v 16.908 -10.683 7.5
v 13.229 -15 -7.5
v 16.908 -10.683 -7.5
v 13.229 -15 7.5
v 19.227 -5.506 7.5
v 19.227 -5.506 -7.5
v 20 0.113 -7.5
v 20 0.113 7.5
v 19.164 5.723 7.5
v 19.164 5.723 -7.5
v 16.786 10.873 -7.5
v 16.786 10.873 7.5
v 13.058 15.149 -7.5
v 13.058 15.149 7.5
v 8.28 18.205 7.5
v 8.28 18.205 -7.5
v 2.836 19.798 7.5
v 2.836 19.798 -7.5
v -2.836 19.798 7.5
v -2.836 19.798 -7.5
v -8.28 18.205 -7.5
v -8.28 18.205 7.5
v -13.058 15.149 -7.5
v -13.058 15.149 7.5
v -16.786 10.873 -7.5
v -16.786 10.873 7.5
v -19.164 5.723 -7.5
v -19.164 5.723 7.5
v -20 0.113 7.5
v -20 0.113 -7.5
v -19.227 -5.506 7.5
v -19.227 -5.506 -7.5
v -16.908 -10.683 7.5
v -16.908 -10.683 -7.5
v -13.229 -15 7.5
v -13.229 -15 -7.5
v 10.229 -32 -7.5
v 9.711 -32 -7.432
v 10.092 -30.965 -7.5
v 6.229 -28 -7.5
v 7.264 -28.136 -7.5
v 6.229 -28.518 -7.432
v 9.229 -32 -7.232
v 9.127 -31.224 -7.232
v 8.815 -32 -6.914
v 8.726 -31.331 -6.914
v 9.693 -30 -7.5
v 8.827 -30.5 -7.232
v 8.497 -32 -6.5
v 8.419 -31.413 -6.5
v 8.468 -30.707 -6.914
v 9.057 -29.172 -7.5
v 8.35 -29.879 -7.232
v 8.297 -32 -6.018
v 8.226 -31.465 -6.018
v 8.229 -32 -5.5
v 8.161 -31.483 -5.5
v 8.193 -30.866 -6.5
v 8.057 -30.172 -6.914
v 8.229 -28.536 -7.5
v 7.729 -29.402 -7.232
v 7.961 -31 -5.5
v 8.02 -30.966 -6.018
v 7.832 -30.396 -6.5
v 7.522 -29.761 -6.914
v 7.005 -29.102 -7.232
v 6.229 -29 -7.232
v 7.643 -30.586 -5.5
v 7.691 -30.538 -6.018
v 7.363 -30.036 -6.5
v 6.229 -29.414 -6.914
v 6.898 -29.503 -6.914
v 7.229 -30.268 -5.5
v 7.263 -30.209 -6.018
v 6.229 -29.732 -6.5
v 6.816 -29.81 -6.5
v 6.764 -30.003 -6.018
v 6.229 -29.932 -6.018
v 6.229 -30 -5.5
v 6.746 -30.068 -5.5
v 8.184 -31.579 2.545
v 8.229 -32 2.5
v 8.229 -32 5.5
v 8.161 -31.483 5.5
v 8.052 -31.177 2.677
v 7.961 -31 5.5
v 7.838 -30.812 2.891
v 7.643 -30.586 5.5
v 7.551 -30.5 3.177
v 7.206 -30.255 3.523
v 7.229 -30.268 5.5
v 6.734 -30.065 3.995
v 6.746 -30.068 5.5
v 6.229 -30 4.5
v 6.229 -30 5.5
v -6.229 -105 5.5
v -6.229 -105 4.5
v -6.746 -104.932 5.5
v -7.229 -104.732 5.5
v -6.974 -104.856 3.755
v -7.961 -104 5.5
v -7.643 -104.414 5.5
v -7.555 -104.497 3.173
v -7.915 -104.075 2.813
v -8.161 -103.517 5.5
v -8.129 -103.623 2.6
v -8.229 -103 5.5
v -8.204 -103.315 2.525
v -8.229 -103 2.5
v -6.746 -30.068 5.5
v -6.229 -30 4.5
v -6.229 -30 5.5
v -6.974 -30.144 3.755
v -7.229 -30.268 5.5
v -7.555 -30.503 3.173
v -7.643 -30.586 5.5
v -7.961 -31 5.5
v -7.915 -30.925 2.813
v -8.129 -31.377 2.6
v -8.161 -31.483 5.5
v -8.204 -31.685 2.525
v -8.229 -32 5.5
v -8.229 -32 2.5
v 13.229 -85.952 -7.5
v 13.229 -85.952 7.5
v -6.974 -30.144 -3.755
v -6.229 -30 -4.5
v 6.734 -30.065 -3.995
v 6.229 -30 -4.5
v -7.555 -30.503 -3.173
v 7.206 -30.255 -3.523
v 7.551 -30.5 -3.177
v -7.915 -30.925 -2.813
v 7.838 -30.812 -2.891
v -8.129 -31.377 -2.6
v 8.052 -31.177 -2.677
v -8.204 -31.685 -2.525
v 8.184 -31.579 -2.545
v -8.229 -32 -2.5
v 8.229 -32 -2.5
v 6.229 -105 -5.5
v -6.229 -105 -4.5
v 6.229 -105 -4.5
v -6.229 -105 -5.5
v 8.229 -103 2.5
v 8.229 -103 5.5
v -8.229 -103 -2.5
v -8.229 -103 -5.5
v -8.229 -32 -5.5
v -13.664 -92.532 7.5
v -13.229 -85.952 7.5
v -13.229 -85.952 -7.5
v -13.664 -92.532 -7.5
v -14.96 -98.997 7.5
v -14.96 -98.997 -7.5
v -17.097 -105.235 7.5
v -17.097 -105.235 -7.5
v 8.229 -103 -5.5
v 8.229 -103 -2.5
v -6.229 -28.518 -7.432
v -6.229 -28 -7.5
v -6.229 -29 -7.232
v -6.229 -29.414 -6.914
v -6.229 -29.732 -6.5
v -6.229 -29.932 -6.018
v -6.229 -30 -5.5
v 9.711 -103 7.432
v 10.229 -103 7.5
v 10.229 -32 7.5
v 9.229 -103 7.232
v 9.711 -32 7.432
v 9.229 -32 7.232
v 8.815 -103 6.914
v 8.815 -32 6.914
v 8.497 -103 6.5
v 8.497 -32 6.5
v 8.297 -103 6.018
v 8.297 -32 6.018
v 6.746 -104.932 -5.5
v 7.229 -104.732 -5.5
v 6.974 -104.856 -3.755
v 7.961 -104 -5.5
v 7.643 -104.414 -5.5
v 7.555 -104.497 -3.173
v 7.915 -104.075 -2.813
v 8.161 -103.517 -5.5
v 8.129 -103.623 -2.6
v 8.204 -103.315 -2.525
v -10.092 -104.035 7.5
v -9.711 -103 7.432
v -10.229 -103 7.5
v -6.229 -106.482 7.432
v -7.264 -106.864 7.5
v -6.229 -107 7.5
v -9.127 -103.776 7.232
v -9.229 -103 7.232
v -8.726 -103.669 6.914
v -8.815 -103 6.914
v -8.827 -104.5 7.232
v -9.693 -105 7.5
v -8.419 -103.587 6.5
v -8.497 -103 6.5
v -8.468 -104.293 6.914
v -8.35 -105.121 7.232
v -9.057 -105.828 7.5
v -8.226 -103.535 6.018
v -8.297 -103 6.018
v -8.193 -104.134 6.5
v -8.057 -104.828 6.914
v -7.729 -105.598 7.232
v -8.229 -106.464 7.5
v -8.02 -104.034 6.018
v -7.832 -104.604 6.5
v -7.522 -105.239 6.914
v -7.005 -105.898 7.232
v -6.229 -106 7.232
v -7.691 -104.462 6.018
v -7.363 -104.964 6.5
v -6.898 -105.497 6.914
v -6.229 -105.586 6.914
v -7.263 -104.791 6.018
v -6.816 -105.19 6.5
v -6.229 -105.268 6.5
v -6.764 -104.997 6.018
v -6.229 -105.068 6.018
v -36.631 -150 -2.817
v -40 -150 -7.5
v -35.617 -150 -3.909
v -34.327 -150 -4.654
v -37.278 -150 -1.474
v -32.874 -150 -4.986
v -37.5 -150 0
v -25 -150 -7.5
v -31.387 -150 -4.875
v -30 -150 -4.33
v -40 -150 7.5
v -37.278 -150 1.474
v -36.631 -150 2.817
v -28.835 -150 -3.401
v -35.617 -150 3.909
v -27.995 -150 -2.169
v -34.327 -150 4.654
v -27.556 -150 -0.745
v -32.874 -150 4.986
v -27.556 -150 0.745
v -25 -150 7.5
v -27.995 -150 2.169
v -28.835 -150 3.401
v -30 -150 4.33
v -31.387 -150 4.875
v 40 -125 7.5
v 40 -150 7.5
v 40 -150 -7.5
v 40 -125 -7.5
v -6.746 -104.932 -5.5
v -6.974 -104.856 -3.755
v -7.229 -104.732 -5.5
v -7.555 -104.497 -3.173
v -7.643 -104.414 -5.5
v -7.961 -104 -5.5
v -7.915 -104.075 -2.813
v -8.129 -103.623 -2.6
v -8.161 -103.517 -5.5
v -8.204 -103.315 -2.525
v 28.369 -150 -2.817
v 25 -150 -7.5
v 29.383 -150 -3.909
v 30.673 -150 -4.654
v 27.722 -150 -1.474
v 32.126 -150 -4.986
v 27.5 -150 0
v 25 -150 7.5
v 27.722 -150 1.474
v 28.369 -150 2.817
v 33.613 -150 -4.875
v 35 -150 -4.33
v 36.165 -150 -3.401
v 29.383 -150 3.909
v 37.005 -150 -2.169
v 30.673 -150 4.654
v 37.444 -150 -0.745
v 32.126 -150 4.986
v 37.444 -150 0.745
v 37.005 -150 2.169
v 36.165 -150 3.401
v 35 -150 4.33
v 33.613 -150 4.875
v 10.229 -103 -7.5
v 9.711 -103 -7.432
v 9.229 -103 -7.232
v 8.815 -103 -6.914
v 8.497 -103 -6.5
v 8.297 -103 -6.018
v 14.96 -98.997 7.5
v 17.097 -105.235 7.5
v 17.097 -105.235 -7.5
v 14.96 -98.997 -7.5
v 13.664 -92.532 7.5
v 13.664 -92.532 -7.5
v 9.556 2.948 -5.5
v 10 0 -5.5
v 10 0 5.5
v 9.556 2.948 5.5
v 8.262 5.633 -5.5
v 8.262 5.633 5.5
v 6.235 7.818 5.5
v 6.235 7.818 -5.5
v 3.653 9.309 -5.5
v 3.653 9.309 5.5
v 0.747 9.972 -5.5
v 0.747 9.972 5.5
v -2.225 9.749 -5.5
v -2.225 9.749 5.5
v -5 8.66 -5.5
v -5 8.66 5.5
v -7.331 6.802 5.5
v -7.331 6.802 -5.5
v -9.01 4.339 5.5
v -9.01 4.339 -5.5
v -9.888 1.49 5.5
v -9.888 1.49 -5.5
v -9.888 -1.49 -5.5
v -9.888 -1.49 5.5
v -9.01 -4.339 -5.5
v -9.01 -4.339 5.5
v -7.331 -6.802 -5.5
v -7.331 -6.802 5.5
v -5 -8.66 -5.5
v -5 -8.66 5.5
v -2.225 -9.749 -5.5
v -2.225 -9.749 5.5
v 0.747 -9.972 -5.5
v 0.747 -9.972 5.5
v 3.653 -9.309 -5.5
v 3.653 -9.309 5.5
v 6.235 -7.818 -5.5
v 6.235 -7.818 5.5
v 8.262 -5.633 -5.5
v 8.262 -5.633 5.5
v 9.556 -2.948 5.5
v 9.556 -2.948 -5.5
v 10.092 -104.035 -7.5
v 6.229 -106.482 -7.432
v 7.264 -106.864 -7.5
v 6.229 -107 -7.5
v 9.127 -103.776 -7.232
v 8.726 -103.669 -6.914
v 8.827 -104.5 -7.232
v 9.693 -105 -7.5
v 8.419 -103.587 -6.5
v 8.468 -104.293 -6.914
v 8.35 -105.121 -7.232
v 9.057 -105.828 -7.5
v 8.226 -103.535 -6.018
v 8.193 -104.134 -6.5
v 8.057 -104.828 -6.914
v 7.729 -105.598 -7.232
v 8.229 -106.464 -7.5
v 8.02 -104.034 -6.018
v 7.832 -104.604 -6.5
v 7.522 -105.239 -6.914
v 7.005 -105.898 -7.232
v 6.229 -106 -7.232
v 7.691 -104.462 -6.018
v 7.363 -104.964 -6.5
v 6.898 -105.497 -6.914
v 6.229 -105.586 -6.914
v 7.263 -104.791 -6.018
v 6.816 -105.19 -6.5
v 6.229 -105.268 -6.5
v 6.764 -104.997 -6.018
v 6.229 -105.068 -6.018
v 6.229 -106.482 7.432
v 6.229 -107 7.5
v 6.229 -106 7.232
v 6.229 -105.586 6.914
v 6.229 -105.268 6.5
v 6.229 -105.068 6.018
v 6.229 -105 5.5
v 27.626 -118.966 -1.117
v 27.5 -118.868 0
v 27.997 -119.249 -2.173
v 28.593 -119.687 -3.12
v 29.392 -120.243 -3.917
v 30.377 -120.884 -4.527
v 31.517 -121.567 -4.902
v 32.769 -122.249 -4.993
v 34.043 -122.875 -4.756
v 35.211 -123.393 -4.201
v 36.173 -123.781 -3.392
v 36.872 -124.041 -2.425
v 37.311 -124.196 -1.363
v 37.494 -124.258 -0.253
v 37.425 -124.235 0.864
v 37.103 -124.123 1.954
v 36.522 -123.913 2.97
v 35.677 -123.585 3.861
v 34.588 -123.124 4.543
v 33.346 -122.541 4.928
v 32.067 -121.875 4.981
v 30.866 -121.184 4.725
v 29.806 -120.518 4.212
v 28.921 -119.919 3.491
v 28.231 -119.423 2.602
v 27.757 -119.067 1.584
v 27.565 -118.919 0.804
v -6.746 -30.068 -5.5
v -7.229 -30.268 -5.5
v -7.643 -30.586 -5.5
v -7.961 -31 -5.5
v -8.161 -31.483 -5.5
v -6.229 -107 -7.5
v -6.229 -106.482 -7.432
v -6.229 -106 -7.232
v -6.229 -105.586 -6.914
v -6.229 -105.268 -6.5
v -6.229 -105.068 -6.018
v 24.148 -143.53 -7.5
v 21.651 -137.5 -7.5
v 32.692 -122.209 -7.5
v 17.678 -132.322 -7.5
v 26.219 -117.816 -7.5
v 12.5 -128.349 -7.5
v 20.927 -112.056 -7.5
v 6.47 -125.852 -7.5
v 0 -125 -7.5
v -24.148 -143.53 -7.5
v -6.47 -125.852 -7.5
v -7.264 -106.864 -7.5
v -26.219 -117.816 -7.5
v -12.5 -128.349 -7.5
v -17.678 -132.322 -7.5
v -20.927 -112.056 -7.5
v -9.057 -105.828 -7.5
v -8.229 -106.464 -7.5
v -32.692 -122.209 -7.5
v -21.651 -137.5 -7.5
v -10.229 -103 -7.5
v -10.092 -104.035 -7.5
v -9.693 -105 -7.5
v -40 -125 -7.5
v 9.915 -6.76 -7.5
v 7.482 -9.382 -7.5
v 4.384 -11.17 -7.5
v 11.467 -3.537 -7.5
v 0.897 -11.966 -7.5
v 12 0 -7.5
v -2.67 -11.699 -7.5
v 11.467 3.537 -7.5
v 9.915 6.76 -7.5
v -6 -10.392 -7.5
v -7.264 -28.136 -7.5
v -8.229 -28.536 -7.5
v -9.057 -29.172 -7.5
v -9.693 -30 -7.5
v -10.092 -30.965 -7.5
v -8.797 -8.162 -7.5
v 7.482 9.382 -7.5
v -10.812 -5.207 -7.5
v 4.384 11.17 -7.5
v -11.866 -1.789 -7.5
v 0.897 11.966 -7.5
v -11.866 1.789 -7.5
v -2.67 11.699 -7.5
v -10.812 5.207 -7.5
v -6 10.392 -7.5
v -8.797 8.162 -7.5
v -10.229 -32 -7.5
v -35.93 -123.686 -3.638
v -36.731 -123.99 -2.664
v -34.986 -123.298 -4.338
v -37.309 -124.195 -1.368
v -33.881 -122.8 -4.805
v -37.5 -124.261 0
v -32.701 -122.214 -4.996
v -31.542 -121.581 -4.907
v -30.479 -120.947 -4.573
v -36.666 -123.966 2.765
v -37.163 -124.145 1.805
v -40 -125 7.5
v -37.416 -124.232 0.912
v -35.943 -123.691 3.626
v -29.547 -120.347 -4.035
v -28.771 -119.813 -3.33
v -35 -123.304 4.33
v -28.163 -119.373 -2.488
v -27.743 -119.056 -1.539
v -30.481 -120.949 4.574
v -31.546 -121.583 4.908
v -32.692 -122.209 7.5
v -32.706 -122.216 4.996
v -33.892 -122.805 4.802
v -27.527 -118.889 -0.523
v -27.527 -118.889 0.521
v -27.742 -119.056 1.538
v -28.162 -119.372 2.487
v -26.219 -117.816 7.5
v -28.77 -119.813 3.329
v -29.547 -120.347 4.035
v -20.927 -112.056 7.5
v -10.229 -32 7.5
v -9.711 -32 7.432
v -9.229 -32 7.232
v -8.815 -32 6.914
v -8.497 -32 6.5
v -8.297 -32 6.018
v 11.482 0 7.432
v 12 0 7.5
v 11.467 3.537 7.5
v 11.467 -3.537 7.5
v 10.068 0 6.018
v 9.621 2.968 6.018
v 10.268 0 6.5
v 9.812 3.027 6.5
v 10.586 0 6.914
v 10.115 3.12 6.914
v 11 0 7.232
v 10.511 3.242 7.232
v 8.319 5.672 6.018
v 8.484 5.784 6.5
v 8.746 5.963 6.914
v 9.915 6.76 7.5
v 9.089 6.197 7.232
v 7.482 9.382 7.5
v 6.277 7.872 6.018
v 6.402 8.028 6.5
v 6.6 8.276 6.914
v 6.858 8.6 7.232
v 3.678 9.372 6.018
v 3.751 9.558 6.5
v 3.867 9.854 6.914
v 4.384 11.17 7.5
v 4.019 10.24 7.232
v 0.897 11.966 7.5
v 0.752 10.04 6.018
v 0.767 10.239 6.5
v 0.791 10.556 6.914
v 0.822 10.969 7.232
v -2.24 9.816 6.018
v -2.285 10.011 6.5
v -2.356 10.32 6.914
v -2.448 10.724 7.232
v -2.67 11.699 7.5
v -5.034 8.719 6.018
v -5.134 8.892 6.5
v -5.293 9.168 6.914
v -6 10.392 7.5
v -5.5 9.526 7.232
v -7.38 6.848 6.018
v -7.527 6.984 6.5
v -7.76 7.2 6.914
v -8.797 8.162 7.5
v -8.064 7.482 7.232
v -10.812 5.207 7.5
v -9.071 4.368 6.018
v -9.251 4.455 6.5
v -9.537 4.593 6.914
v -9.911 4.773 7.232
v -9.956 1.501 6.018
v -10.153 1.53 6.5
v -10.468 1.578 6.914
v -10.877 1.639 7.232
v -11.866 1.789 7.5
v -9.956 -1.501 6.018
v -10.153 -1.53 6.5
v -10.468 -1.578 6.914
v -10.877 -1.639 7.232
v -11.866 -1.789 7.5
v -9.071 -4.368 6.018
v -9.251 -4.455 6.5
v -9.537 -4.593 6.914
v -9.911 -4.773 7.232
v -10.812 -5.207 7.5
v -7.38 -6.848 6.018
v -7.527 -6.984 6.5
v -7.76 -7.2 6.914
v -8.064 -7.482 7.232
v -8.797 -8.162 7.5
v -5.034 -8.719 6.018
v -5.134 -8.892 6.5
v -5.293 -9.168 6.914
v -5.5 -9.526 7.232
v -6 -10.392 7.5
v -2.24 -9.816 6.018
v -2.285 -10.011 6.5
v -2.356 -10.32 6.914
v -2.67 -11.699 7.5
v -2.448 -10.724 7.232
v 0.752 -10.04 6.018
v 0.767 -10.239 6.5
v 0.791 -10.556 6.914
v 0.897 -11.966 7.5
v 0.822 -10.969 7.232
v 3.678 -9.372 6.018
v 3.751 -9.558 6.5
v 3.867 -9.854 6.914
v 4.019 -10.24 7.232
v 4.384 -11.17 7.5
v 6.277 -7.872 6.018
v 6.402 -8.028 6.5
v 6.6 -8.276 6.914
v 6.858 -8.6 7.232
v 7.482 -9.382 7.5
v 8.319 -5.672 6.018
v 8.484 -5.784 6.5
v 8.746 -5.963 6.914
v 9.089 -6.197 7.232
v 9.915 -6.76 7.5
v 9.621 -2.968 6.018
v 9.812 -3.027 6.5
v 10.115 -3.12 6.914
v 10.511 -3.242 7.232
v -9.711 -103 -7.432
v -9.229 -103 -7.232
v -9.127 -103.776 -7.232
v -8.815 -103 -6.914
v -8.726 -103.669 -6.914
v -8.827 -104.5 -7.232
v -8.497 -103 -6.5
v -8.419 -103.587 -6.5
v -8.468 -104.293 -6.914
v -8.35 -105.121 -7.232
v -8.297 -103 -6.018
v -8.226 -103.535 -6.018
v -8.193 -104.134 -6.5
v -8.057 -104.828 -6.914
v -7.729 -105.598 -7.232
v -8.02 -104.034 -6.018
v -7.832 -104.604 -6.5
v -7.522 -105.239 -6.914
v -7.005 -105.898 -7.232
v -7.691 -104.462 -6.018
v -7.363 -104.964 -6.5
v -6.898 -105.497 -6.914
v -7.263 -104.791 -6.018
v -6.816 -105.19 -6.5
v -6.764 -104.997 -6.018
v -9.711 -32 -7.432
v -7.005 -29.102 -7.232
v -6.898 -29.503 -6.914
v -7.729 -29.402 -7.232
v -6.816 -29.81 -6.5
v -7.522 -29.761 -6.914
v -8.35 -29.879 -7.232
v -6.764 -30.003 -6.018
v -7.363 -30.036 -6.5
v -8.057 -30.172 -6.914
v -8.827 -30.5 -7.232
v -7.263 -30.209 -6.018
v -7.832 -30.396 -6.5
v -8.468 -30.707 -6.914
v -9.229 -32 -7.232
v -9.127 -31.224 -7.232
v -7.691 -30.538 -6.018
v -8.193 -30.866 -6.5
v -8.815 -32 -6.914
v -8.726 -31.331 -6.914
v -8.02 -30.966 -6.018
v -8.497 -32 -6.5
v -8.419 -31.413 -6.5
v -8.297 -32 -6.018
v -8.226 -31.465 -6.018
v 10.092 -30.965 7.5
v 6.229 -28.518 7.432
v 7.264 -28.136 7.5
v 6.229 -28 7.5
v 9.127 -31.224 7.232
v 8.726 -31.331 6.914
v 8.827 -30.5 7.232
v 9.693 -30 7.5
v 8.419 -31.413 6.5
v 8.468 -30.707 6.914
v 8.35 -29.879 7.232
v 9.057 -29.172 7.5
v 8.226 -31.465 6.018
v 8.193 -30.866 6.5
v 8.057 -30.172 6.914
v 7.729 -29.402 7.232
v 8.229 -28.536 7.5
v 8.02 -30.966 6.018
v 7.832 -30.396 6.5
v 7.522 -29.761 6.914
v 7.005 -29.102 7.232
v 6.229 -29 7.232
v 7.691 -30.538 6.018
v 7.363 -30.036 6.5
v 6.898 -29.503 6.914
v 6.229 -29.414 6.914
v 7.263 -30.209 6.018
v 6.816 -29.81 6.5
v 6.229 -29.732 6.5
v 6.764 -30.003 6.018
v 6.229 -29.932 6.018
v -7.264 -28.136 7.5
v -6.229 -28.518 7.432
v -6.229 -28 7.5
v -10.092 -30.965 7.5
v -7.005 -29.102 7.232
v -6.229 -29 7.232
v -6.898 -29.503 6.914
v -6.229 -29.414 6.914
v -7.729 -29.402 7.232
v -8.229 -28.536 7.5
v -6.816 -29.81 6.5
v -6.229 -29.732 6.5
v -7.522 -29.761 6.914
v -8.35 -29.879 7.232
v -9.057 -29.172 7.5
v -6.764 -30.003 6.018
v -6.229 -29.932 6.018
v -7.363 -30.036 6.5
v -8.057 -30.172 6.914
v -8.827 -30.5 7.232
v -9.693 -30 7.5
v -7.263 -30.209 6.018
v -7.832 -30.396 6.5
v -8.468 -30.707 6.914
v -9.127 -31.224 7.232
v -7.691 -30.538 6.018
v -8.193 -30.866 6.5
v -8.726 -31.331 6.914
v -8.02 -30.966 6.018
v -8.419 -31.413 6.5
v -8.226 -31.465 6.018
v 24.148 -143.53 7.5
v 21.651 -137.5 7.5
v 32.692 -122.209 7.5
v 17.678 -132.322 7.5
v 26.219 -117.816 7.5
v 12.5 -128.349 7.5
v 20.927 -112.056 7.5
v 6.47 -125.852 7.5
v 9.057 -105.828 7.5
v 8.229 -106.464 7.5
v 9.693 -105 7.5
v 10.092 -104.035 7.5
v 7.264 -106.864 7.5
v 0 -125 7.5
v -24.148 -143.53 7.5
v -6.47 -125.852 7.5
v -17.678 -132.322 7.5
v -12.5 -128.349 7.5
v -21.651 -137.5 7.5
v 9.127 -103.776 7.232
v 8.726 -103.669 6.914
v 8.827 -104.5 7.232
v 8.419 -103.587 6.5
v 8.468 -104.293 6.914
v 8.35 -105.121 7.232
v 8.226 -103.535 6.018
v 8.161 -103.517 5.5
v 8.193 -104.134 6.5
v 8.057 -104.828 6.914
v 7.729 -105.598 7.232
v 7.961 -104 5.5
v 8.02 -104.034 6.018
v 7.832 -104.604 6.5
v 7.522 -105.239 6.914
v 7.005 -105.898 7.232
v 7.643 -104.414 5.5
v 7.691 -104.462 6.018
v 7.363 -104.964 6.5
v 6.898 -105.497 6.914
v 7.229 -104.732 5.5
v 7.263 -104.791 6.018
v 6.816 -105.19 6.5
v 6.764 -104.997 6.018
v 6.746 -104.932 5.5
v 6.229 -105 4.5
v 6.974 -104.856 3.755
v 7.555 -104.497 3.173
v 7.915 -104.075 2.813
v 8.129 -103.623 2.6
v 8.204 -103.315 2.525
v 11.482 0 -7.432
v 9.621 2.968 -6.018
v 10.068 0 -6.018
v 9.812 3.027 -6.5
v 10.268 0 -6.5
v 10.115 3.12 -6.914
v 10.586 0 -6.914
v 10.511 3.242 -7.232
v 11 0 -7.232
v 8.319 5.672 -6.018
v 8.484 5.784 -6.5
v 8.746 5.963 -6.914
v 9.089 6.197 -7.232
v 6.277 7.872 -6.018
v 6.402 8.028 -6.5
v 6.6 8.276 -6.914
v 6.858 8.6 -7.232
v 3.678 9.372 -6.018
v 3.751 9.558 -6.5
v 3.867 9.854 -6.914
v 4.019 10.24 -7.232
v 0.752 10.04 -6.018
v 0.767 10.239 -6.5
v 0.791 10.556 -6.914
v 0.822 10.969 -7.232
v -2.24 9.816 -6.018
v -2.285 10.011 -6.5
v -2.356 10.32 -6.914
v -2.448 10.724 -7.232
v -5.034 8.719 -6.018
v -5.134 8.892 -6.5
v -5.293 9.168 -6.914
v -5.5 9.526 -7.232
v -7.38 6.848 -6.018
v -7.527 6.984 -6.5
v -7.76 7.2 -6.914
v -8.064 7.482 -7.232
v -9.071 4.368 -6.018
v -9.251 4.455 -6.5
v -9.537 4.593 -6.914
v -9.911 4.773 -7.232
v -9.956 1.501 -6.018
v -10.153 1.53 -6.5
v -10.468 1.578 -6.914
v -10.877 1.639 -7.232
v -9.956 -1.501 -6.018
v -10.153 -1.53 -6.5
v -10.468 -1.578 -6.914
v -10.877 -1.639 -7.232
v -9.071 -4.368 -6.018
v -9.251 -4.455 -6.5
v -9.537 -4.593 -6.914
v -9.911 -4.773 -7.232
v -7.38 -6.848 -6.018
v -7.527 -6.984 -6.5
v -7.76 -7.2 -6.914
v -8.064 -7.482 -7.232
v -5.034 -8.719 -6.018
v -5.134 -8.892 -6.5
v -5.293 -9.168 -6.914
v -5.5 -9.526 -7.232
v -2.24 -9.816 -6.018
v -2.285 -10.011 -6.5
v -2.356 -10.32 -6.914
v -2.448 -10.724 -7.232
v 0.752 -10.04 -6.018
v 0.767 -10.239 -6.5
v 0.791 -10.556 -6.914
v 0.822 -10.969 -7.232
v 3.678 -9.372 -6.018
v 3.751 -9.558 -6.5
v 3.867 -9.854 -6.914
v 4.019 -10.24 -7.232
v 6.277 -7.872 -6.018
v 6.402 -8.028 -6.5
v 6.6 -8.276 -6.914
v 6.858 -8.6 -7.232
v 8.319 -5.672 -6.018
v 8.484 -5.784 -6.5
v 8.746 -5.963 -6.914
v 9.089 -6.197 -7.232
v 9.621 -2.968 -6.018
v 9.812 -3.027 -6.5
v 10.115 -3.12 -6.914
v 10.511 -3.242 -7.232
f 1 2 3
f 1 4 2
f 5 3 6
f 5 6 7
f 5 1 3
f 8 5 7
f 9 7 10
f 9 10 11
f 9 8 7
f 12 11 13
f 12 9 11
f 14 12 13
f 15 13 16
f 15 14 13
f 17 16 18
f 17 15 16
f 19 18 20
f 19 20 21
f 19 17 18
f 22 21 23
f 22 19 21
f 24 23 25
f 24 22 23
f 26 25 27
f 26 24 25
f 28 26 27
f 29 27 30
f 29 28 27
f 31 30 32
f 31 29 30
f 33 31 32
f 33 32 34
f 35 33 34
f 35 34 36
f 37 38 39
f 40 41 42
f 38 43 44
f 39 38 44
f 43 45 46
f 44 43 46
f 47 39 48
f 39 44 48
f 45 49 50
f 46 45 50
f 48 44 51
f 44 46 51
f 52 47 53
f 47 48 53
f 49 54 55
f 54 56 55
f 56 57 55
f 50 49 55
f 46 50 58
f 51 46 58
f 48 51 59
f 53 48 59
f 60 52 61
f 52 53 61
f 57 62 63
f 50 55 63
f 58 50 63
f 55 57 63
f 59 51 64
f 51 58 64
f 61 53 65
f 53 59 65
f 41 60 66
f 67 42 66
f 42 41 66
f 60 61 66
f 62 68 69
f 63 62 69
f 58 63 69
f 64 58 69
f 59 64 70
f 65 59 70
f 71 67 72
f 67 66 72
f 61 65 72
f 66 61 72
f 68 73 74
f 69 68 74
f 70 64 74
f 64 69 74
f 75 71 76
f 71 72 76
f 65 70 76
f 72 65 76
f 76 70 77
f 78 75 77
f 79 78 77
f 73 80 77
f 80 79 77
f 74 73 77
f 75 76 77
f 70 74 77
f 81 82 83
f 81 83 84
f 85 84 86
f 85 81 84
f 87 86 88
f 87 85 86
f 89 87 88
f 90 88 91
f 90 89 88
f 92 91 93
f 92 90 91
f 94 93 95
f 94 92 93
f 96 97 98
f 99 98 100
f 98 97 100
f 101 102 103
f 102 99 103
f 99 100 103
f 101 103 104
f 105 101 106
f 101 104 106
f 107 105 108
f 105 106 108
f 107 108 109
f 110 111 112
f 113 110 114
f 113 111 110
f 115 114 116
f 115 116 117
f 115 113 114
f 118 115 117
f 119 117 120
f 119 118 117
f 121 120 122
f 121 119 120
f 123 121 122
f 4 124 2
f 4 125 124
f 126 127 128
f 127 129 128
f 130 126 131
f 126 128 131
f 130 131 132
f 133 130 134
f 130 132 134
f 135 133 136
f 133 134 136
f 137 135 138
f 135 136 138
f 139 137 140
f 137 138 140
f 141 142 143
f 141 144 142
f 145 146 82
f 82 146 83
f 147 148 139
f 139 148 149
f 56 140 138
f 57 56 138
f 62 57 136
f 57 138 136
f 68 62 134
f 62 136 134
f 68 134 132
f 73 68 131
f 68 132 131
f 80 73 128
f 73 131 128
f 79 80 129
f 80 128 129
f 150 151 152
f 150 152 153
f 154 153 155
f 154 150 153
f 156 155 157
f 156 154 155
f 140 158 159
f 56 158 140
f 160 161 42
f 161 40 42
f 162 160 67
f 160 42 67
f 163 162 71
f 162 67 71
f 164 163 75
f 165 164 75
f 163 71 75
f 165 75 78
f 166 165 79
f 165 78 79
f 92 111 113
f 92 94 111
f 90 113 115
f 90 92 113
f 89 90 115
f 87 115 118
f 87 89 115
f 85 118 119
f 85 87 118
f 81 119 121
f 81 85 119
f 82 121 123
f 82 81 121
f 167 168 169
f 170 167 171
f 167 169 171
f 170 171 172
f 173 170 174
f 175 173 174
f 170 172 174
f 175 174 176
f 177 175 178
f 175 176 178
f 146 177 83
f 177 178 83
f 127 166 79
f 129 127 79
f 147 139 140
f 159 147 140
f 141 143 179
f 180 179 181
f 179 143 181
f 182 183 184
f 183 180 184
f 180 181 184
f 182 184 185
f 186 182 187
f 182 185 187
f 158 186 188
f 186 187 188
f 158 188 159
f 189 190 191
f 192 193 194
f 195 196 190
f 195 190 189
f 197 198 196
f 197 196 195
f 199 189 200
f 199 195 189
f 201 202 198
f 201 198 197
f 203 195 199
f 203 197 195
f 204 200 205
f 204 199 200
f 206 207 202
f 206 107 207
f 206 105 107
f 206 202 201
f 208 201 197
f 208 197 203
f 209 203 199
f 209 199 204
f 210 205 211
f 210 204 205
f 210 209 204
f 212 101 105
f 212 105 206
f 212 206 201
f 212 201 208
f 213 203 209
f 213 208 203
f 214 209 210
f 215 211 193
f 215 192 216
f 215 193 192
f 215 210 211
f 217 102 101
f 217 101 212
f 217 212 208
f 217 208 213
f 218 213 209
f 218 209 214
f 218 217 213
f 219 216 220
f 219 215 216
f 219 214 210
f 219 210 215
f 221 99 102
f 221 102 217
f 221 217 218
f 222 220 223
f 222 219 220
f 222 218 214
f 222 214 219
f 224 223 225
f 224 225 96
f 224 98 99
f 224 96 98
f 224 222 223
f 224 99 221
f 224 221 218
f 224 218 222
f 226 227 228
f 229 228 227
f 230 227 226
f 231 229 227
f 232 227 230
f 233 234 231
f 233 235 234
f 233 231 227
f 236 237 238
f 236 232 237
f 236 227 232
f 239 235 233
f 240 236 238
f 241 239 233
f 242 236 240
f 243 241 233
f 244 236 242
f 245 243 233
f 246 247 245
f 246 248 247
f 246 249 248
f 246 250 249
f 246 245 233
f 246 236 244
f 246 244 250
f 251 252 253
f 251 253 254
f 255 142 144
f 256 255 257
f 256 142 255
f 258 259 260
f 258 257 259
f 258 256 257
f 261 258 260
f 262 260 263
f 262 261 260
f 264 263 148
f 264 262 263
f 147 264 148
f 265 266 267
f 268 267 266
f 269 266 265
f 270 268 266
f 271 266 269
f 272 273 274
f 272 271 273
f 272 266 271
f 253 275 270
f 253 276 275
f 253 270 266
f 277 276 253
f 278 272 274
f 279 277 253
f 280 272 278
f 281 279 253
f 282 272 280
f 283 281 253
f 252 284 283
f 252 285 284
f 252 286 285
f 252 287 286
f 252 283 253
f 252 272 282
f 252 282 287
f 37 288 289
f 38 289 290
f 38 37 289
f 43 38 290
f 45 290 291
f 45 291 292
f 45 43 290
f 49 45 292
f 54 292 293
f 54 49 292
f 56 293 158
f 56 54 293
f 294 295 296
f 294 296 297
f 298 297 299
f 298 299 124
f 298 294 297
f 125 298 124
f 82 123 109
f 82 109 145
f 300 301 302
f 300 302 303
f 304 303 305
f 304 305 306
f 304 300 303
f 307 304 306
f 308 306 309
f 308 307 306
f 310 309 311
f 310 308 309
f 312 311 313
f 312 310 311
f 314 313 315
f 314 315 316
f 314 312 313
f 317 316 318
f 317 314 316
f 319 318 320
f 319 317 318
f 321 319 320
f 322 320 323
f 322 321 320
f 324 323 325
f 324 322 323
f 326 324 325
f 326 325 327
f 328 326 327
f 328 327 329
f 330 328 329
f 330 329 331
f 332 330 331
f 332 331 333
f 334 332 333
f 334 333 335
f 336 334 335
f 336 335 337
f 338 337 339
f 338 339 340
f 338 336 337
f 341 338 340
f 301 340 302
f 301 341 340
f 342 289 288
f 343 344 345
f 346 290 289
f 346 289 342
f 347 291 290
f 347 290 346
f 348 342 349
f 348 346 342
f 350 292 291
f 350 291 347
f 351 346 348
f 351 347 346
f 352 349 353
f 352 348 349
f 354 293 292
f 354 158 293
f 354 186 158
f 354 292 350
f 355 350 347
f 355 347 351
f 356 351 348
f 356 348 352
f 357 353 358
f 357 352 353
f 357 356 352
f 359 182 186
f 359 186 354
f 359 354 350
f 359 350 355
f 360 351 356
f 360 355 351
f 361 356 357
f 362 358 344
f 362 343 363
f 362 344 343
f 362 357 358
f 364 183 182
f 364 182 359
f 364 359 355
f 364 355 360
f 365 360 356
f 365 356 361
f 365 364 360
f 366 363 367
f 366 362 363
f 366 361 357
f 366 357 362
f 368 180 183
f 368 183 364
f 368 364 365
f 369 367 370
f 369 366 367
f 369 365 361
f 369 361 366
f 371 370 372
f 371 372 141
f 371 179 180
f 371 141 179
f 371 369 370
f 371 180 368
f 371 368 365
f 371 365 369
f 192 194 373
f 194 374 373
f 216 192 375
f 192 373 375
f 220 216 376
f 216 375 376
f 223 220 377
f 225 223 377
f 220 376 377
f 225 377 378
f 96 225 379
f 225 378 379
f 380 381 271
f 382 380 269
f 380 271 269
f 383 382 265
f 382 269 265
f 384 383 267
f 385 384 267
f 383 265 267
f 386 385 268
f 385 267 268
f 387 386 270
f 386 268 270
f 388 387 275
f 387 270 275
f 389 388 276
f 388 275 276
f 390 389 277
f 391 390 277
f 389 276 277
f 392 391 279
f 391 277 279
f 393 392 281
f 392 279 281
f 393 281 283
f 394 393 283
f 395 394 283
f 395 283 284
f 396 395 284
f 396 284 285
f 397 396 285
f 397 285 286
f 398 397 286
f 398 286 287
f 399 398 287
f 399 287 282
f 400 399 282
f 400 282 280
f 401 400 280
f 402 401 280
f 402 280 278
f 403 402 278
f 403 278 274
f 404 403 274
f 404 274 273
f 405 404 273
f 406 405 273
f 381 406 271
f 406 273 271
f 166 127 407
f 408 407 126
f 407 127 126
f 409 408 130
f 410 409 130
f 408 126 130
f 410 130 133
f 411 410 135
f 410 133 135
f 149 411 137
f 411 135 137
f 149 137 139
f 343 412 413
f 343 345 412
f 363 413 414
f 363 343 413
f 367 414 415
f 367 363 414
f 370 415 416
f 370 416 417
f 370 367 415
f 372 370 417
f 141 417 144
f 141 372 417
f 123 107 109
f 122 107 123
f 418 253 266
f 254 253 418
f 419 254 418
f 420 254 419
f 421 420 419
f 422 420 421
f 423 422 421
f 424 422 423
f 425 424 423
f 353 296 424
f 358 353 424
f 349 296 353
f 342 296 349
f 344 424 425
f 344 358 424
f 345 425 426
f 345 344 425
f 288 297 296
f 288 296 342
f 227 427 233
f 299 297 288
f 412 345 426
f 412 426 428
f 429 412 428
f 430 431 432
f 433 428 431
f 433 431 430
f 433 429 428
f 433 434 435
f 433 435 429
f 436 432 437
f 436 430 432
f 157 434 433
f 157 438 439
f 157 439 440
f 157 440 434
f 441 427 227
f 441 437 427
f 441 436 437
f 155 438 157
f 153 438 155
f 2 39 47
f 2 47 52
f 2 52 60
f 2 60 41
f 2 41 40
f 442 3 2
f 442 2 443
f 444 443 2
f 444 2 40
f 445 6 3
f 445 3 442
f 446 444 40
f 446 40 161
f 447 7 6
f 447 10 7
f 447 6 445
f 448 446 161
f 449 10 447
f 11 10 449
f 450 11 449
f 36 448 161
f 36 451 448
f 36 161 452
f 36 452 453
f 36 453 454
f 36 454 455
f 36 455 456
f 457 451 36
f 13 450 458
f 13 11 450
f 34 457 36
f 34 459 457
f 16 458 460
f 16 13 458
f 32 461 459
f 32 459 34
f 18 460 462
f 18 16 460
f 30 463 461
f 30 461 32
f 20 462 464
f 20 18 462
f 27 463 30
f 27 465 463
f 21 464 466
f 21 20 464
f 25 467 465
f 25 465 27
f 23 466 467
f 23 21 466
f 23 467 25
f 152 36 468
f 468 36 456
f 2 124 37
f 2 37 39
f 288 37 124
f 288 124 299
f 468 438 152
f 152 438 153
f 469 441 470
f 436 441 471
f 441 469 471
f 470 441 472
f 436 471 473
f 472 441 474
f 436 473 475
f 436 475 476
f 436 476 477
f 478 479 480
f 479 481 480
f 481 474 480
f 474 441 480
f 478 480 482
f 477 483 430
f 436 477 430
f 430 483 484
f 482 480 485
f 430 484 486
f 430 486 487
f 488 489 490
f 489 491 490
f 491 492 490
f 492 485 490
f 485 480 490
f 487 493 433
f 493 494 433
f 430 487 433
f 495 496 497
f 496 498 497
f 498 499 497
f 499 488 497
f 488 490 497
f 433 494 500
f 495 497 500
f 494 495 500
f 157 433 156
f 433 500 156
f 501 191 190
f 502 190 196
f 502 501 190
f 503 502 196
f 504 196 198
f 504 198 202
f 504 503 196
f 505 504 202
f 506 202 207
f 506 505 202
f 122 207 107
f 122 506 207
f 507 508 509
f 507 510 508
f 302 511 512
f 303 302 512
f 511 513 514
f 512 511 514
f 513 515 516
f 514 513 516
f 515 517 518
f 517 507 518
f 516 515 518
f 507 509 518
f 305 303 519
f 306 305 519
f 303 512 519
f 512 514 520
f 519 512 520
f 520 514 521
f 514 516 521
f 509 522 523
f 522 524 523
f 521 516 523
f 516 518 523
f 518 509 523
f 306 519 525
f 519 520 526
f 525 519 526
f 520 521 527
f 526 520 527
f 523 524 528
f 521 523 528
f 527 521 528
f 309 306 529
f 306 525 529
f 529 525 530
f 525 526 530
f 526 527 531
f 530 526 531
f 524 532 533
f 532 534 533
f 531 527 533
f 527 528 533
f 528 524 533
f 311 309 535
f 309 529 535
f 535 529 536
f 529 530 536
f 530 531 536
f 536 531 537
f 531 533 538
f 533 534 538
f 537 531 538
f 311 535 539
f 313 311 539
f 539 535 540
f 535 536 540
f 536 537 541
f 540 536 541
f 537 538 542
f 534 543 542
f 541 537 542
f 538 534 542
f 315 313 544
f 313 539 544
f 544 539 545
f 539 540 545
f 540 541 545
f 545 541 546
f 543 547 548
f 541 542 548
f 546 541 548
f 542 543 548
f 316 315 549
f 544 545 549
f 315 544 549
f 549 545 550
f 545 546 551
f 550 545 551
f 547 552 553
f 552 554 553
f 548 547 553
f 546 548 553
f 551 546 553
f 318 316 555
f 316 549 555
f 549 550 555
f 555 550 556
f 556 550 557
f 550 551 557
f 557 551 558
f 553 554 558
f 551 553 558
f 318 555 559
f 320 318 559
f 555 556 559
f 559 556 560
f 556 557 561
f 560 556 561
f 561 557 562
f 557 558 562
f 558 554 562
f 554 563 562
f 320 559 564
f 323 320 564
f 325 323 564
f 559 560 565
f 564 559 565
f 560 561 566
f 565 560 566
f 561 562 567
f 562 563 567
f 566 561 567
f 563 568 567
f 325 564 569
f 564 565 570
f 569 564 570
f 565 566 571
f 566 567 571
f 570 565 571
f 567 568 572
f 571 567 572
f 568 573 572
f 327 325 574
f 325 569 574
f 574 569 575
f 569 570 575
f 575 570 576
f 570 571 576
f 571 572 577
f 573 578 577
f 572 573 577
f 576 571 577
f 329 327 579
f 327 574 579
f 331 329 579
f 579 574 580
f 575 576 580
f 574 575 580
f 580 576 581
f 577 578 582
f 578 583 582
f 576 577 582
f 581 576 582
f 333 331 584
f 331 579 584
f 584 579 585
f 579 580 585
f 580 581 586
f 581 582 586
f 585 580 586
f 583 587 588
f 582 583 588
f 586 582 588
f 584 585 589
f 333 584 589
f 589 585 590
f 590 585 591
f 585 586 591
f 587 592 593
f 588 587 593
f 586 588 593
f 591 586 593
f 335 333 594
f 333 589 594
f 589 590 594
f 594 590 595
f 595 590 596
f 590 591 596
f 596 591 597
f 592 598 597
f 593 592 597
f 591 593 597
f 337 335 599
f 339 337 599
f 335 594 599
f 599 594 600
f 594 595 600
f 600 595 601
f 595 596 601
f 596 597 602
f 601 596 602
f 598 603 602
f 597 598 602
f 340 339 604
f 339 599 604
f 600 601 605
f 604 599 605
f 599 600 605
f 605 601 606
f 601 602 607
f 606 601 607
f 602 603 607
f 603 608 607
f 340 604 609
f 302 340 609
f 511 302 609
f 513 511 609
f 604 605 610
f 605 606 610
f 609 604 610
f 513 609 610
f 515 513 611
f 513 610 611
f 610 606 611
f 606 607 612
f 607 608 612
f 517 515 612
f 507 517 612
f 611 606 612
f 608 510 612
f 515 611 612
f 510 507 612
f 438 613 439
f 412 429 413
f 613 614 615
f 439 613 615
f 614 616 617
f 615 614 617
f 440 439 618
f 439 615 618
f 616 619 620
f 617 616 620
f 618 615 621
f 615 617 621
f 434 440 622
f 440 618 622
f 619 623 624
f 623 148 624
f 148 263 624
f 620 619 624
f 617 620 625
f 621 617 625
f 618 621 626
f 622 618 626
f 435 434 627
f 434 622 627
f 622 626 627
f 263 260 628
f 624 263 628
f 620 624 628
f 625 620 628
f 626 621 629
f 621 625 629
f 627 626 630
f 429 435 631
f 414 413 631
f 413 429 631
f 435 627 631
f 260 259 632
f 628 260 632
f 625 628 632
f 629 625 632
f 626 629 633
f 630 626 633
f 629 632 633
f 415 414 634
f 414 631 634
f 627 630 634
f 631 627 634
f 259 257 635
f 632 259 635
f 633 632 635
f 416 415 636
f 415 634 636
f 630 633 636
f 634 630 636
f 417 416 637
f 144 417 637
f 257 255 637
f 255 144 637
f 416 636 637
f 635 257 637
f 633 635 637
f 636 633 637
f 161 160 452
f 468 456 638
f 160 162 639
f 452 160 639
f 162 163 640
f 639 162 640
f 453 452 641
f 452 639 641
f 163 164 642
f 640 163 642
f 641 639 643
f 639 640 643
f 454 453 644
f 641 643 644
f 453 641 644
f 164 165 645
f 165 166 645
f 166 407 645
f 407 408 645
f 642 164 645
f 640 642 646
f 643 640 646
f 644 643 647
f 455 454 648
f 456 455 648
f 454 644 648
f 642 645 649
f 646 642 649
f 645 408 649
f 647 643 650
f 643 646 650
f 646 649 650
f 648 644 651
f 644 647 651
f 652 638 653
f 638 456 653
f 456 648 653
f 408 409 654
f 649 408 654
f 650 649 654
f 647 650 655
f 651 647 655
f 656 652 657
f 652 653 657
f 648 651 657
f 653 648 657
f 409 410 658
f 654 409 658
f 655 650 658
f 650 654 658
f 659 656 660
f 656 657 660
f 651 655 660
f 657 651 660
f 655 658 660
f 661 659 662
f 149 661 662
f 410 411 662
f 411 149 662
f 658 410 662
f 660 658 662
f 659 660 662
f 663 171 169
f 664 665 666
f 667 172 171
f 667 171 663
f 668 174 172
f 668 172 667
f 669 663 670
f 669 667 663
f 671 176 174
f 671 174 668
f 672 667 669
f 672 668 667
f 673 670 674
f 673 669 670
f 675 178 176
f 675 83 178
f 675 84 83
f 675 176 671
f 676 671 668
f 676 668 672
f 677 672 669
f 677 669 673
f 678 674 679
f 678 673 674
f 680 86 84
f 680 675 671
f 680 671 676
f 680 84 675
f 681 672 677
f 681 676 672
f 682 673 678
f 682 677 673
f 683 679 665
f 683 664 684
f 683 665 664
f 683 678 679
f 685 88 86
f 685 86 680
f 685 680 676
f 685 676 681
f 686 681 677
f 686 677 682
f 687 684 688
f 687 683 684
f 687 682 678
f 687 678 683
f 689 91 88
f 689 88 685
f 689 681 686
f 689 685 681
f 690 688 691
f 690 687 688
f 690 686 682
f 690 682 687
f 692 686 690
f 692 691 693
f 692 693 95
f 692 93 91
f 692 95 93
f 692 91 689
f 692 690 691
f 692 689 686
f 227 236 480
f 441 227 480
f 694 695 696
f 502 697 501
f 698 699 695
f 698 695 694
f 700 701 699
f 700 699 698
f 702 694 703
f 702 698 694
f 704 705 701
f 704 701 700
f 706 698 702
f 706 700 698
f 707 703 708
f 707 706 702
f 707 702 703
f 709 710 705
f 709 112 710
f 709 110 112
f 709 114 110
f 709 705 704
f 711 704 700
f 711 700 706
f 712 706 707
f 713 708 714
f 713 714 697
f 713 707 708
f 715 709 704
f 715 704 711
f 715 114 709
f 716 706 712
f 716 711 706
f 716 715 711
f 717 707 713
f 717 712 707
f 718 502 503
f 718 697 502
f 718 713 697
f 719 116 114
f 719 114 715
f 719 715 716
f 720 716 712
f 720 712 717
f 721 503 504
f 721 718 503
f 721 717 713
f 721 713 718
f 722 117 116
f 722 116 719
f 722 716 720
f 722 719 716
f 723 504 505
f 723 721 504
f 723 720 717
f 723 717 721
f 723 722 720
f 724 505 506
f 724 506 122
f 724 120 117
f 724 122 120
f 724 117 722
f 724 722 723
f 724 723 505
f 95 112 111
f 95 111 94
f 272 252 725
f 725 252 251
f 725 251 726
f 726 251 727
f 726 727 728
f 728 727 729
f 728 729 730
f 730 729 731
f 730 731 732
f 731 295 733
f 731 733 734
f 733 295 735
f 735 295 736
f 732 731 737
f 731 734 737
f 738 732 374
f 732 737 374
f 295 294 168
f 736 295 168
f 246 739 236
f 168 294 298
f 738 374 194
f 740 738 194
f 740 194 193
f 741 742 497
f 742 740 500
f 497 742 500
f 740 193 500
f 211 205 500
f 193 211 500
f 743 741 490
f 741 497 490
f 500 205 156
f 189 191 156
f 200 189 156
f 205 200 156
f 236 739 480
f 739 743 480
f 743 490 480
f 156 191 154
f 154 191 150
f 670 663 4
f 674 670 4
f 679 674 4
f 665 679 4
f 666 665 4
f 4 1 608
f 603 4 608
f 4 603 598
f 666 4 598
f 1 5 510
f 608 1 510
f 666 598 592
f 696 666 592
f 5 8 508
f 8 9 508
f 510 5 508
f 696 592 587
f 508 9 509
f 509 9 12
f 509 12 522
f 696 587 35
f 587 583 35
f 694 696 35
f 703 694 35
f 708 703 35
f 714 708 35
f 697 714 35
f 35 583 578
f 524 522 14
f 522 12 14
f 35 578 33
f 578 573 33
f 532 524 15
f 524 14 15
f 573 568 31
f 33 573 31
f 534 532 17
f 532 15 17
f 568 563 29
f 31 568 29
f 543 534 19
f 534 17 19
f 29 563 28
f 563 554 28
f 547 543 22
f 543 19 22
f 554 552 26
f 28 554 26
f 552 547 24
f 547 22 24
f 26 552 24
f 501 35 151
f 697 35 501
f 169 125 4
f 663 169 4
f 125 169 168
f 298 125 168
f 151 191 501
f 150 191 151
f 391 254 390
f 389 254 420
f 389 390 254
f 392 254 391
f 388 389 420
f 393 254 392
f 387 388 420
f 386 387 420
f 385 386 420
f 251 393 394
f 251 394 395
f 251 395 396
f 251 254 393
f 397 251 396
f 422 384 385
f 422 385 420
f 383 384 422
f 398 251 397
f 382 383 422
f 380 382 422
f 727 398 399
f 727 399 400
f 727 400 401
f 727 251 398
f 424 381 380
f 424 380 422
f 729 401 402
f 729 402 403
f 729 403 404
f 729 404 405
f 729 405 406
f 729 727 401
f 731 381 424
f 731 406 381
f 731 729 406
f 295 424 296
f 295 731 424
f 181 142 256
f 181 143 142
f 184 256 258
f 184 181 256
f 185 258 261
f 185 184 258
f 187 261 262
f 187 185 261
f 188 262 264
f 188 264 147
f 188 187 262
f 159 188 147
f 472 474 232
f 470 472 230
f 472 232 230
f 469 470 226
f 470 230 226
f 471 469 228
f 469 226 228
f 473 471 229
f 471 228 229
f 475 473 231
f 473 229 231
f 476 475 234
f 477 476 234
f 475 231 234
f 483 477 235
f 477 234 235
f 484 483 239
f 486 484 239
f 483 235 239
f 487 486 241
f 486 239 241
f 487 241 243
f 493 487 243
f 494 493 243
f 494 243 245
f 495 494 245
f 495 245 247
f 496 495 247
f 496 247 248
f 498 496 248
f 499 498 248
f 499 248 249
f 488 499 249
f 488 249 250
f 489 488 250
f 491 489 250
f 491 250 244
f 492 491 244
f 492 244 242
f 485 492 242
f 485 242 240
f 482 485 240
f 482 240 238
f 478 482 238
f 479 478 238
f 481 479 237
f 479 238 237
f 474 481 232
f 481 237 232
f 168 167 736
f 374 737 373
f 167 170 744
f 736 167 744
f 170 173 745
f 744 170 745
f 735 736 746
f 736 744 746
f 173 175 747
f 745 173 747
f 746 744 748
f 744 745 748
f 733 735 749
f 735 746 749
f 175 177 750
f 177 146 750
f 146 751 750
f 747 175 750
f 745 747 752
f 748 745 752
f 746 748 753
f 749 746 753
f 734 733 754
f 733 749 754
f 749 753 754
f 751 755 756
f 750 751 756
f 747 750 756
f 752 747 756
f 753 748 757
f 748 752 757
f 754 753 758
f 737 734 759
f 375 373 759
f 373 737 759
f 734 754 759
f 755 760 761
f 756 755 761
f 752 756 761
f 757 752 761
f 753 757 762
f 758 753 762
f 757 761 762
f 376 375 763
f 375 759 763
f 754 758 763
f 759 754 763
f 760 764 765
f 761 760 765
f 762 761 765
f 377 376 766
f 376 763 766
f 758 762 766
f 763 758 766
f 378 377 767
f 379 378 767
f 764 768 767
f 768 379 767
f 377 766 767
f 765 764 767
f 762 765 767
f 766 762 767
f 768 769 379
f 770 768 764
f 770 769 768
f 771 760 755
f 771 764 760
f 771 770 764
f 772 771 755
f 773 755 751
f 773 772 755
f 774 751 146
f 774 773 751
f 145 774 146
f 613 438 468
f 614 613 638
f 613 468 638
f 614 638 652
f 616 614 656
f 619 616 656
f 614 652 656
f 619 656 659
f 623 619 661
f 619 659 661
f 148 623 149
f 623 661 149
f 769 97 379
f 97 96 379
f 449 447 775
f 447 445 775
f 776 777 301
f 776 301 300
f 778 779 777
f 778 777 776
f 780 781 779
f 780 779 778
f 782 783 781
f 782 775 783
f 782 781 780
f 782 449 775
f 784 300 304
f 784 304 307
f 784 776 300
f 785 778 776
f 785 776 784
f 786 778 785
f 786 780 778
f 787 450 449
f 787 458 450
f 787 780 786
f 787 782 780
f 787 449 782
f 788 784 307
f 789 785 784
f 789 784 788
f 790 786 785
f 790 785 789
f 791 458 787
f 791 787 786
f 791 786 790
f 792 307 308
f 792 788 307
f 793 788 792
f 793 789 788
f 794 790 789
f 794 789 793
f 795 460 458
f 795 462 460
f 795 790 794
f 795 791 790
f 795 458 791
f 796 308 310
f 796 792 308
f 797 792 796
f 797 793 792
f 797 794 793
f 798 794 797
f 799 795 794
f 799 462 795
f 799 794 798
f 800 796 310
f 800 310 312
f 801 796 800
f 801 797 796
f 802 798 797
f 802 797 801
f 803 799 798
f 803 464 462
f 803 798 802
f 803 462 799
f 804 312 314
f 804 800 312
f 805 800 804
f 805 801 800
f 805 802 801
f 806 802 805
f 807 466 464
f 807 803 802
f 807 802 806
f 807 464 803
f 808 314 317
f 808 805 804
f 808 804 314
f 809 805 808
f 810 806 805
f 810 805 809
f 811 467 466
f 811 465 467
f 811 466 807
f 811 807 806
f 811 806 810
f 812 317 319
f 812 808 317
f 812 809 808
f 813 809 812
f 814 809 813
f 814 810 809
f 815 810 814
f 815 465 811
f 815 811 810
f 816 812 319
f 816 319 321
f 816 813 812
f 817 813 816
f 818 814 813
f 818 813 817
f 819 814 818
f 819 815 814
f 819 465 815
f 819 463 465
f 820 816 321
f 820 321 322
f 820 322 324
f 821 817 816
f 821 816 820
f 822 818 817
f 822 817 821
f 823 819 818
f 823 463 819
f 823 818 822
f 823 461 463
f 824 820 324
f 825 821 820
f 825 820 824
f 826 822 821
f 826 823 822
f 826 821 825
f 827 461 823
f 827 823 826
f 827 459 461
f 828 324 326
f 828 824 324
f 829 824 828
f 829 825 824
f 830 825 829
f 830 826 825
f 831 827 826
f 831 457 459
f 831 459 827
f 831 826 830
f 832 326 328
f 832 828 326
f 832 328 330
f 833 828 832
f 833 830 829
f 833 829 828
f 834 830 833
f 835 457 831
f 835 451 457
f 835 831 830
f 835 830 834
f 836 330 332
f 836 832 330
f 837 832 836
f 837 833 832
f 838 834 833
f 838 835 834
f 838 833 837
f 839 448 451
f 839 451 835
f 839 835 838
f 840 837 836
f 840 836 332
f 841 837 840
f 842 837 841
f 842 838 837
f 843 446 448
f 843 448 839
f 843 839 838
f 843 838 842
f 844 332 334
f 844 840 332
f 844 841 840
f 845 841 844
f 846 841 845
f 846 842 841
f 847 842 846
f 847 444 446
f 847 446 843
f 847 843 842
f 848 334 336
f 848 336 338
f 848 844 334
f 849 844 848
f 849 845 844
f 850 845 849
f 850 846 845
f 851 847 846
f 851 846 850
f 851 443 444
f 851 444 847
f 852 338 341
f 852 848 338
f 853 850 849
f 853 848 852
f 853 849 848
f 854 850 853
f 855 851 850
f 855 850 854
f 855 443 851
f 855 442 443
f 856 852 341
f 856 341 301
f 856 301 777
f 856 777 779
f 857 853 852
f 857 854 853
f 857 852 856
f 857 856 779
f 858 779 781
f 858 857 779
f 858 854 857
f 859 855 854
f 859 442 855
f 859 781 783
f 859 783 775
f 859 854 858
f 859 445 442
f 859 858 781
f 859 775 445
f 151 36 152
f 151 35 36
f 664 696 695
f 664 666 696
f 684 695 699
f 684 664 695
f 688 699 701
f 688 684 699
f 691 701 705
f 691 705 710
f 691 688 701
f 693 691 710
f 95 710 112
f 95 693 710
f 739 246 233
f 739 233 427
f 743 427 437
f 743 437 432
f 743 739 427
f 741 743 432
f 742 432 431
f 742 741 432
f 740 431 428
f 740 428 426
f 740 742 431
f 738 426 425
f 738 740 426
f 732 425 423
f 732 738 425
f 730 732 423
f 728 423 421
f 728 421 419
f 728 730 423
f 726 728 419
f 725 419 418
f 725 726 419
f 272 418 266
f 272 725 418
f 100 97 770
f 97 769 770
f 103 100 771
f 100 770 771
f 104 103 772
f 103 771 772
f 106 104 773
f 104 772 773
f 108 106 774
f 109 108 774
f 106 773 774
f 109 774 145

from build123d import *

# Parameters (mm, degrees)
BOSS_EXTRUDE1_DEPTH = 7.5
SKETCH2_R           = 10
CUT_EXTRUDE1_DEPTH  = 8.5
SKETCH3_W           = 16.45751311
SKETCH3_H           = 74.99964242
CUT_EXTRUDE2_DEPTH  = 5
FILLET2_R           = 2
FILLET3_R           = 2
FILLET4_R           = 2
BOSS_EXTRUDE2_DEPTH = 15
SKETCH8_R           = 5
CUT_EXTRUDE3_DEPTH  = 171


with BuildPart() as part:
    # Sketch1 → Boss-Extrude1 (new body)
    with BuildSketch(Plane.XY):
        with BuildLine():
            Line((-13.228756555, -15), (-13.228756555, -85.952171431))
            ThreePointArc((-13.228756555, -85.952171431), (-17.096585846, -105.234879374), (-28.10166958, -121.534298414))
            ThreePointArc((-28.10166958, -121.534298414), (-36.905736568, -134.573833645), (-40, -150))
            Line((-40, -150), (-25, -150))
            ThreePointArc((-25, -150), (-17.67766953, -132.32233047), (0, -125))
            ThreePointArc((0, -125), (17.67766953, -132.32233047), (25, -150))
            Line((25, -150), (40, -150))
            ThreePointArc((40, -150), (36.905736568, -134.573833645), (28.10166958, -121.534298414))
            ThreePointArc((28.10166958, -121.534298414), (17.096585846, -105.234879374), (13.228756555, -85.952171431))
            Line((13.228756555, -85.952171431), (13.228756555, -15))
            ThreePointArc((13.228756555, -15), (0, 20), (-13.228756555, -15))
        make_face()
    extrude(amount=BOSS_EXTRUDE1_DEPTH)

    # Sketch2 → Cut-Extrude1 (cut, through all)
    with BuildSketch(Plane.XY.offset(7.5)):
        Circle(SKETCH2_R)
    extrude(amount=-CUT_EXTRUDE1_DEPTH, mode=Mode.SUBTRACT)

    # Sketch3 → Cut-Extrude2 (cut)
    with BuildSketch(Plane.XY.offset(7.5)):
        with Locations((0, -67.5)):
            Rectangle(SKETCH3_W, SKETCH3_H)
    extrude(amount=-CUT_EXTRUDE2_DEPTH, mode=Mode.SUBTRACT)

    # Fillet2
    fillet2_edges = [part.edges().sort_by_distance(p)[0] for p in [
        (8.228756555, -30.00017879, 5),
        (0, -104.99982121, 2.5),
        (8.228756555, -104.99982121, 5),
        (-8.228756555, -104.99982121, 5),
        (0, -30.00017879, 2.5),
        (-8.228756555, -30.00017879, 5),
        (8.228756555, -67.5, 7.5),
        (0, -30.00017879, 7.5),
        (-8.228756555, -67.5, 7.5),
        (0, -104.99982121, 7.5),
    ]]
    fillet(fillet2_edges, radius=FILLET2_R)

    # Mirror1: part across plane


with BuildPart() as part_1:
    add(part.part)
    add(part.part.mirror(Plane(origin=(-63.228756555, -85.952171431, 0), x_dir=(1, 0, 0), z_dir=(0, 0, 1))))

    # Fillet3
    fillet3_edges = [part_1.edges().sort_by_distance(p)[0] for p in [
        (-10, 0, 7.5),
    ]]
    fillet(fillet3_edges, radius=FILLET3_R)

    # Fillet4
    fillet4_edges = [part_1.edges().sort_by_distance(p)[0] for p in [
        (-10, 0, -7.5),
    ]]
    fillet(fillet4_edges, radius=FILLET4_R)

    # Sketch7 → Boss-Extrude2 (add)
    with BuildSketch(Plane.XY.offset(7.5)):
        with BuildLine():
            Line((-40, -150), (-40, -125))
            ThreePointArc((-40, -125), (-26.219237737, -117.816300802), (-17.096585846, -105.234879374))
            ThreePointArc((-17.096585846, -105.234879374), (-21.789831556, -113.931011558), (-28.10166958, -121.534298414))
            ThreePointArc((-28.10166958, -121.534298414), (-36.905736568, -134.573833645), (-40, -150))
        make_face()
        with BuildLine():
            Line((40, -150), (40, -125))
            ThreePointArc((40, -125), (26.219237737, -117.816300802), (17.096585846, -105.234879374))
            ThreePointArc((17.096585846, -105.234879374), (21.789831556, -113.931011558), (28.10166958, -121.534298414))
            ThreePointArc((28.10166958, -121.534298414), (36.905736568, -134.573833645), (40, -150))
        make_face()
    extrude(amount=-BOSS_EXTRUDE2_DEPTH)

    # Sketch8 → Cut-Extrude3 (cut, through all)
    with BuildSketch(Plane(origin=(0, -150, 0), x_dir=(-1, 0, 0), z_dir=(0, -1, 0))):
        with Locations((32.5, 0)):
            Circle(SKETCH8_R)
        with Locations((-32.5, 0)):
            Circle(SKETCH8_R)
    extrude(amount=-CUT_EXTRUDE3_DEPTH, mode=Mode.SUBTRACT)


solid = part_1.part
